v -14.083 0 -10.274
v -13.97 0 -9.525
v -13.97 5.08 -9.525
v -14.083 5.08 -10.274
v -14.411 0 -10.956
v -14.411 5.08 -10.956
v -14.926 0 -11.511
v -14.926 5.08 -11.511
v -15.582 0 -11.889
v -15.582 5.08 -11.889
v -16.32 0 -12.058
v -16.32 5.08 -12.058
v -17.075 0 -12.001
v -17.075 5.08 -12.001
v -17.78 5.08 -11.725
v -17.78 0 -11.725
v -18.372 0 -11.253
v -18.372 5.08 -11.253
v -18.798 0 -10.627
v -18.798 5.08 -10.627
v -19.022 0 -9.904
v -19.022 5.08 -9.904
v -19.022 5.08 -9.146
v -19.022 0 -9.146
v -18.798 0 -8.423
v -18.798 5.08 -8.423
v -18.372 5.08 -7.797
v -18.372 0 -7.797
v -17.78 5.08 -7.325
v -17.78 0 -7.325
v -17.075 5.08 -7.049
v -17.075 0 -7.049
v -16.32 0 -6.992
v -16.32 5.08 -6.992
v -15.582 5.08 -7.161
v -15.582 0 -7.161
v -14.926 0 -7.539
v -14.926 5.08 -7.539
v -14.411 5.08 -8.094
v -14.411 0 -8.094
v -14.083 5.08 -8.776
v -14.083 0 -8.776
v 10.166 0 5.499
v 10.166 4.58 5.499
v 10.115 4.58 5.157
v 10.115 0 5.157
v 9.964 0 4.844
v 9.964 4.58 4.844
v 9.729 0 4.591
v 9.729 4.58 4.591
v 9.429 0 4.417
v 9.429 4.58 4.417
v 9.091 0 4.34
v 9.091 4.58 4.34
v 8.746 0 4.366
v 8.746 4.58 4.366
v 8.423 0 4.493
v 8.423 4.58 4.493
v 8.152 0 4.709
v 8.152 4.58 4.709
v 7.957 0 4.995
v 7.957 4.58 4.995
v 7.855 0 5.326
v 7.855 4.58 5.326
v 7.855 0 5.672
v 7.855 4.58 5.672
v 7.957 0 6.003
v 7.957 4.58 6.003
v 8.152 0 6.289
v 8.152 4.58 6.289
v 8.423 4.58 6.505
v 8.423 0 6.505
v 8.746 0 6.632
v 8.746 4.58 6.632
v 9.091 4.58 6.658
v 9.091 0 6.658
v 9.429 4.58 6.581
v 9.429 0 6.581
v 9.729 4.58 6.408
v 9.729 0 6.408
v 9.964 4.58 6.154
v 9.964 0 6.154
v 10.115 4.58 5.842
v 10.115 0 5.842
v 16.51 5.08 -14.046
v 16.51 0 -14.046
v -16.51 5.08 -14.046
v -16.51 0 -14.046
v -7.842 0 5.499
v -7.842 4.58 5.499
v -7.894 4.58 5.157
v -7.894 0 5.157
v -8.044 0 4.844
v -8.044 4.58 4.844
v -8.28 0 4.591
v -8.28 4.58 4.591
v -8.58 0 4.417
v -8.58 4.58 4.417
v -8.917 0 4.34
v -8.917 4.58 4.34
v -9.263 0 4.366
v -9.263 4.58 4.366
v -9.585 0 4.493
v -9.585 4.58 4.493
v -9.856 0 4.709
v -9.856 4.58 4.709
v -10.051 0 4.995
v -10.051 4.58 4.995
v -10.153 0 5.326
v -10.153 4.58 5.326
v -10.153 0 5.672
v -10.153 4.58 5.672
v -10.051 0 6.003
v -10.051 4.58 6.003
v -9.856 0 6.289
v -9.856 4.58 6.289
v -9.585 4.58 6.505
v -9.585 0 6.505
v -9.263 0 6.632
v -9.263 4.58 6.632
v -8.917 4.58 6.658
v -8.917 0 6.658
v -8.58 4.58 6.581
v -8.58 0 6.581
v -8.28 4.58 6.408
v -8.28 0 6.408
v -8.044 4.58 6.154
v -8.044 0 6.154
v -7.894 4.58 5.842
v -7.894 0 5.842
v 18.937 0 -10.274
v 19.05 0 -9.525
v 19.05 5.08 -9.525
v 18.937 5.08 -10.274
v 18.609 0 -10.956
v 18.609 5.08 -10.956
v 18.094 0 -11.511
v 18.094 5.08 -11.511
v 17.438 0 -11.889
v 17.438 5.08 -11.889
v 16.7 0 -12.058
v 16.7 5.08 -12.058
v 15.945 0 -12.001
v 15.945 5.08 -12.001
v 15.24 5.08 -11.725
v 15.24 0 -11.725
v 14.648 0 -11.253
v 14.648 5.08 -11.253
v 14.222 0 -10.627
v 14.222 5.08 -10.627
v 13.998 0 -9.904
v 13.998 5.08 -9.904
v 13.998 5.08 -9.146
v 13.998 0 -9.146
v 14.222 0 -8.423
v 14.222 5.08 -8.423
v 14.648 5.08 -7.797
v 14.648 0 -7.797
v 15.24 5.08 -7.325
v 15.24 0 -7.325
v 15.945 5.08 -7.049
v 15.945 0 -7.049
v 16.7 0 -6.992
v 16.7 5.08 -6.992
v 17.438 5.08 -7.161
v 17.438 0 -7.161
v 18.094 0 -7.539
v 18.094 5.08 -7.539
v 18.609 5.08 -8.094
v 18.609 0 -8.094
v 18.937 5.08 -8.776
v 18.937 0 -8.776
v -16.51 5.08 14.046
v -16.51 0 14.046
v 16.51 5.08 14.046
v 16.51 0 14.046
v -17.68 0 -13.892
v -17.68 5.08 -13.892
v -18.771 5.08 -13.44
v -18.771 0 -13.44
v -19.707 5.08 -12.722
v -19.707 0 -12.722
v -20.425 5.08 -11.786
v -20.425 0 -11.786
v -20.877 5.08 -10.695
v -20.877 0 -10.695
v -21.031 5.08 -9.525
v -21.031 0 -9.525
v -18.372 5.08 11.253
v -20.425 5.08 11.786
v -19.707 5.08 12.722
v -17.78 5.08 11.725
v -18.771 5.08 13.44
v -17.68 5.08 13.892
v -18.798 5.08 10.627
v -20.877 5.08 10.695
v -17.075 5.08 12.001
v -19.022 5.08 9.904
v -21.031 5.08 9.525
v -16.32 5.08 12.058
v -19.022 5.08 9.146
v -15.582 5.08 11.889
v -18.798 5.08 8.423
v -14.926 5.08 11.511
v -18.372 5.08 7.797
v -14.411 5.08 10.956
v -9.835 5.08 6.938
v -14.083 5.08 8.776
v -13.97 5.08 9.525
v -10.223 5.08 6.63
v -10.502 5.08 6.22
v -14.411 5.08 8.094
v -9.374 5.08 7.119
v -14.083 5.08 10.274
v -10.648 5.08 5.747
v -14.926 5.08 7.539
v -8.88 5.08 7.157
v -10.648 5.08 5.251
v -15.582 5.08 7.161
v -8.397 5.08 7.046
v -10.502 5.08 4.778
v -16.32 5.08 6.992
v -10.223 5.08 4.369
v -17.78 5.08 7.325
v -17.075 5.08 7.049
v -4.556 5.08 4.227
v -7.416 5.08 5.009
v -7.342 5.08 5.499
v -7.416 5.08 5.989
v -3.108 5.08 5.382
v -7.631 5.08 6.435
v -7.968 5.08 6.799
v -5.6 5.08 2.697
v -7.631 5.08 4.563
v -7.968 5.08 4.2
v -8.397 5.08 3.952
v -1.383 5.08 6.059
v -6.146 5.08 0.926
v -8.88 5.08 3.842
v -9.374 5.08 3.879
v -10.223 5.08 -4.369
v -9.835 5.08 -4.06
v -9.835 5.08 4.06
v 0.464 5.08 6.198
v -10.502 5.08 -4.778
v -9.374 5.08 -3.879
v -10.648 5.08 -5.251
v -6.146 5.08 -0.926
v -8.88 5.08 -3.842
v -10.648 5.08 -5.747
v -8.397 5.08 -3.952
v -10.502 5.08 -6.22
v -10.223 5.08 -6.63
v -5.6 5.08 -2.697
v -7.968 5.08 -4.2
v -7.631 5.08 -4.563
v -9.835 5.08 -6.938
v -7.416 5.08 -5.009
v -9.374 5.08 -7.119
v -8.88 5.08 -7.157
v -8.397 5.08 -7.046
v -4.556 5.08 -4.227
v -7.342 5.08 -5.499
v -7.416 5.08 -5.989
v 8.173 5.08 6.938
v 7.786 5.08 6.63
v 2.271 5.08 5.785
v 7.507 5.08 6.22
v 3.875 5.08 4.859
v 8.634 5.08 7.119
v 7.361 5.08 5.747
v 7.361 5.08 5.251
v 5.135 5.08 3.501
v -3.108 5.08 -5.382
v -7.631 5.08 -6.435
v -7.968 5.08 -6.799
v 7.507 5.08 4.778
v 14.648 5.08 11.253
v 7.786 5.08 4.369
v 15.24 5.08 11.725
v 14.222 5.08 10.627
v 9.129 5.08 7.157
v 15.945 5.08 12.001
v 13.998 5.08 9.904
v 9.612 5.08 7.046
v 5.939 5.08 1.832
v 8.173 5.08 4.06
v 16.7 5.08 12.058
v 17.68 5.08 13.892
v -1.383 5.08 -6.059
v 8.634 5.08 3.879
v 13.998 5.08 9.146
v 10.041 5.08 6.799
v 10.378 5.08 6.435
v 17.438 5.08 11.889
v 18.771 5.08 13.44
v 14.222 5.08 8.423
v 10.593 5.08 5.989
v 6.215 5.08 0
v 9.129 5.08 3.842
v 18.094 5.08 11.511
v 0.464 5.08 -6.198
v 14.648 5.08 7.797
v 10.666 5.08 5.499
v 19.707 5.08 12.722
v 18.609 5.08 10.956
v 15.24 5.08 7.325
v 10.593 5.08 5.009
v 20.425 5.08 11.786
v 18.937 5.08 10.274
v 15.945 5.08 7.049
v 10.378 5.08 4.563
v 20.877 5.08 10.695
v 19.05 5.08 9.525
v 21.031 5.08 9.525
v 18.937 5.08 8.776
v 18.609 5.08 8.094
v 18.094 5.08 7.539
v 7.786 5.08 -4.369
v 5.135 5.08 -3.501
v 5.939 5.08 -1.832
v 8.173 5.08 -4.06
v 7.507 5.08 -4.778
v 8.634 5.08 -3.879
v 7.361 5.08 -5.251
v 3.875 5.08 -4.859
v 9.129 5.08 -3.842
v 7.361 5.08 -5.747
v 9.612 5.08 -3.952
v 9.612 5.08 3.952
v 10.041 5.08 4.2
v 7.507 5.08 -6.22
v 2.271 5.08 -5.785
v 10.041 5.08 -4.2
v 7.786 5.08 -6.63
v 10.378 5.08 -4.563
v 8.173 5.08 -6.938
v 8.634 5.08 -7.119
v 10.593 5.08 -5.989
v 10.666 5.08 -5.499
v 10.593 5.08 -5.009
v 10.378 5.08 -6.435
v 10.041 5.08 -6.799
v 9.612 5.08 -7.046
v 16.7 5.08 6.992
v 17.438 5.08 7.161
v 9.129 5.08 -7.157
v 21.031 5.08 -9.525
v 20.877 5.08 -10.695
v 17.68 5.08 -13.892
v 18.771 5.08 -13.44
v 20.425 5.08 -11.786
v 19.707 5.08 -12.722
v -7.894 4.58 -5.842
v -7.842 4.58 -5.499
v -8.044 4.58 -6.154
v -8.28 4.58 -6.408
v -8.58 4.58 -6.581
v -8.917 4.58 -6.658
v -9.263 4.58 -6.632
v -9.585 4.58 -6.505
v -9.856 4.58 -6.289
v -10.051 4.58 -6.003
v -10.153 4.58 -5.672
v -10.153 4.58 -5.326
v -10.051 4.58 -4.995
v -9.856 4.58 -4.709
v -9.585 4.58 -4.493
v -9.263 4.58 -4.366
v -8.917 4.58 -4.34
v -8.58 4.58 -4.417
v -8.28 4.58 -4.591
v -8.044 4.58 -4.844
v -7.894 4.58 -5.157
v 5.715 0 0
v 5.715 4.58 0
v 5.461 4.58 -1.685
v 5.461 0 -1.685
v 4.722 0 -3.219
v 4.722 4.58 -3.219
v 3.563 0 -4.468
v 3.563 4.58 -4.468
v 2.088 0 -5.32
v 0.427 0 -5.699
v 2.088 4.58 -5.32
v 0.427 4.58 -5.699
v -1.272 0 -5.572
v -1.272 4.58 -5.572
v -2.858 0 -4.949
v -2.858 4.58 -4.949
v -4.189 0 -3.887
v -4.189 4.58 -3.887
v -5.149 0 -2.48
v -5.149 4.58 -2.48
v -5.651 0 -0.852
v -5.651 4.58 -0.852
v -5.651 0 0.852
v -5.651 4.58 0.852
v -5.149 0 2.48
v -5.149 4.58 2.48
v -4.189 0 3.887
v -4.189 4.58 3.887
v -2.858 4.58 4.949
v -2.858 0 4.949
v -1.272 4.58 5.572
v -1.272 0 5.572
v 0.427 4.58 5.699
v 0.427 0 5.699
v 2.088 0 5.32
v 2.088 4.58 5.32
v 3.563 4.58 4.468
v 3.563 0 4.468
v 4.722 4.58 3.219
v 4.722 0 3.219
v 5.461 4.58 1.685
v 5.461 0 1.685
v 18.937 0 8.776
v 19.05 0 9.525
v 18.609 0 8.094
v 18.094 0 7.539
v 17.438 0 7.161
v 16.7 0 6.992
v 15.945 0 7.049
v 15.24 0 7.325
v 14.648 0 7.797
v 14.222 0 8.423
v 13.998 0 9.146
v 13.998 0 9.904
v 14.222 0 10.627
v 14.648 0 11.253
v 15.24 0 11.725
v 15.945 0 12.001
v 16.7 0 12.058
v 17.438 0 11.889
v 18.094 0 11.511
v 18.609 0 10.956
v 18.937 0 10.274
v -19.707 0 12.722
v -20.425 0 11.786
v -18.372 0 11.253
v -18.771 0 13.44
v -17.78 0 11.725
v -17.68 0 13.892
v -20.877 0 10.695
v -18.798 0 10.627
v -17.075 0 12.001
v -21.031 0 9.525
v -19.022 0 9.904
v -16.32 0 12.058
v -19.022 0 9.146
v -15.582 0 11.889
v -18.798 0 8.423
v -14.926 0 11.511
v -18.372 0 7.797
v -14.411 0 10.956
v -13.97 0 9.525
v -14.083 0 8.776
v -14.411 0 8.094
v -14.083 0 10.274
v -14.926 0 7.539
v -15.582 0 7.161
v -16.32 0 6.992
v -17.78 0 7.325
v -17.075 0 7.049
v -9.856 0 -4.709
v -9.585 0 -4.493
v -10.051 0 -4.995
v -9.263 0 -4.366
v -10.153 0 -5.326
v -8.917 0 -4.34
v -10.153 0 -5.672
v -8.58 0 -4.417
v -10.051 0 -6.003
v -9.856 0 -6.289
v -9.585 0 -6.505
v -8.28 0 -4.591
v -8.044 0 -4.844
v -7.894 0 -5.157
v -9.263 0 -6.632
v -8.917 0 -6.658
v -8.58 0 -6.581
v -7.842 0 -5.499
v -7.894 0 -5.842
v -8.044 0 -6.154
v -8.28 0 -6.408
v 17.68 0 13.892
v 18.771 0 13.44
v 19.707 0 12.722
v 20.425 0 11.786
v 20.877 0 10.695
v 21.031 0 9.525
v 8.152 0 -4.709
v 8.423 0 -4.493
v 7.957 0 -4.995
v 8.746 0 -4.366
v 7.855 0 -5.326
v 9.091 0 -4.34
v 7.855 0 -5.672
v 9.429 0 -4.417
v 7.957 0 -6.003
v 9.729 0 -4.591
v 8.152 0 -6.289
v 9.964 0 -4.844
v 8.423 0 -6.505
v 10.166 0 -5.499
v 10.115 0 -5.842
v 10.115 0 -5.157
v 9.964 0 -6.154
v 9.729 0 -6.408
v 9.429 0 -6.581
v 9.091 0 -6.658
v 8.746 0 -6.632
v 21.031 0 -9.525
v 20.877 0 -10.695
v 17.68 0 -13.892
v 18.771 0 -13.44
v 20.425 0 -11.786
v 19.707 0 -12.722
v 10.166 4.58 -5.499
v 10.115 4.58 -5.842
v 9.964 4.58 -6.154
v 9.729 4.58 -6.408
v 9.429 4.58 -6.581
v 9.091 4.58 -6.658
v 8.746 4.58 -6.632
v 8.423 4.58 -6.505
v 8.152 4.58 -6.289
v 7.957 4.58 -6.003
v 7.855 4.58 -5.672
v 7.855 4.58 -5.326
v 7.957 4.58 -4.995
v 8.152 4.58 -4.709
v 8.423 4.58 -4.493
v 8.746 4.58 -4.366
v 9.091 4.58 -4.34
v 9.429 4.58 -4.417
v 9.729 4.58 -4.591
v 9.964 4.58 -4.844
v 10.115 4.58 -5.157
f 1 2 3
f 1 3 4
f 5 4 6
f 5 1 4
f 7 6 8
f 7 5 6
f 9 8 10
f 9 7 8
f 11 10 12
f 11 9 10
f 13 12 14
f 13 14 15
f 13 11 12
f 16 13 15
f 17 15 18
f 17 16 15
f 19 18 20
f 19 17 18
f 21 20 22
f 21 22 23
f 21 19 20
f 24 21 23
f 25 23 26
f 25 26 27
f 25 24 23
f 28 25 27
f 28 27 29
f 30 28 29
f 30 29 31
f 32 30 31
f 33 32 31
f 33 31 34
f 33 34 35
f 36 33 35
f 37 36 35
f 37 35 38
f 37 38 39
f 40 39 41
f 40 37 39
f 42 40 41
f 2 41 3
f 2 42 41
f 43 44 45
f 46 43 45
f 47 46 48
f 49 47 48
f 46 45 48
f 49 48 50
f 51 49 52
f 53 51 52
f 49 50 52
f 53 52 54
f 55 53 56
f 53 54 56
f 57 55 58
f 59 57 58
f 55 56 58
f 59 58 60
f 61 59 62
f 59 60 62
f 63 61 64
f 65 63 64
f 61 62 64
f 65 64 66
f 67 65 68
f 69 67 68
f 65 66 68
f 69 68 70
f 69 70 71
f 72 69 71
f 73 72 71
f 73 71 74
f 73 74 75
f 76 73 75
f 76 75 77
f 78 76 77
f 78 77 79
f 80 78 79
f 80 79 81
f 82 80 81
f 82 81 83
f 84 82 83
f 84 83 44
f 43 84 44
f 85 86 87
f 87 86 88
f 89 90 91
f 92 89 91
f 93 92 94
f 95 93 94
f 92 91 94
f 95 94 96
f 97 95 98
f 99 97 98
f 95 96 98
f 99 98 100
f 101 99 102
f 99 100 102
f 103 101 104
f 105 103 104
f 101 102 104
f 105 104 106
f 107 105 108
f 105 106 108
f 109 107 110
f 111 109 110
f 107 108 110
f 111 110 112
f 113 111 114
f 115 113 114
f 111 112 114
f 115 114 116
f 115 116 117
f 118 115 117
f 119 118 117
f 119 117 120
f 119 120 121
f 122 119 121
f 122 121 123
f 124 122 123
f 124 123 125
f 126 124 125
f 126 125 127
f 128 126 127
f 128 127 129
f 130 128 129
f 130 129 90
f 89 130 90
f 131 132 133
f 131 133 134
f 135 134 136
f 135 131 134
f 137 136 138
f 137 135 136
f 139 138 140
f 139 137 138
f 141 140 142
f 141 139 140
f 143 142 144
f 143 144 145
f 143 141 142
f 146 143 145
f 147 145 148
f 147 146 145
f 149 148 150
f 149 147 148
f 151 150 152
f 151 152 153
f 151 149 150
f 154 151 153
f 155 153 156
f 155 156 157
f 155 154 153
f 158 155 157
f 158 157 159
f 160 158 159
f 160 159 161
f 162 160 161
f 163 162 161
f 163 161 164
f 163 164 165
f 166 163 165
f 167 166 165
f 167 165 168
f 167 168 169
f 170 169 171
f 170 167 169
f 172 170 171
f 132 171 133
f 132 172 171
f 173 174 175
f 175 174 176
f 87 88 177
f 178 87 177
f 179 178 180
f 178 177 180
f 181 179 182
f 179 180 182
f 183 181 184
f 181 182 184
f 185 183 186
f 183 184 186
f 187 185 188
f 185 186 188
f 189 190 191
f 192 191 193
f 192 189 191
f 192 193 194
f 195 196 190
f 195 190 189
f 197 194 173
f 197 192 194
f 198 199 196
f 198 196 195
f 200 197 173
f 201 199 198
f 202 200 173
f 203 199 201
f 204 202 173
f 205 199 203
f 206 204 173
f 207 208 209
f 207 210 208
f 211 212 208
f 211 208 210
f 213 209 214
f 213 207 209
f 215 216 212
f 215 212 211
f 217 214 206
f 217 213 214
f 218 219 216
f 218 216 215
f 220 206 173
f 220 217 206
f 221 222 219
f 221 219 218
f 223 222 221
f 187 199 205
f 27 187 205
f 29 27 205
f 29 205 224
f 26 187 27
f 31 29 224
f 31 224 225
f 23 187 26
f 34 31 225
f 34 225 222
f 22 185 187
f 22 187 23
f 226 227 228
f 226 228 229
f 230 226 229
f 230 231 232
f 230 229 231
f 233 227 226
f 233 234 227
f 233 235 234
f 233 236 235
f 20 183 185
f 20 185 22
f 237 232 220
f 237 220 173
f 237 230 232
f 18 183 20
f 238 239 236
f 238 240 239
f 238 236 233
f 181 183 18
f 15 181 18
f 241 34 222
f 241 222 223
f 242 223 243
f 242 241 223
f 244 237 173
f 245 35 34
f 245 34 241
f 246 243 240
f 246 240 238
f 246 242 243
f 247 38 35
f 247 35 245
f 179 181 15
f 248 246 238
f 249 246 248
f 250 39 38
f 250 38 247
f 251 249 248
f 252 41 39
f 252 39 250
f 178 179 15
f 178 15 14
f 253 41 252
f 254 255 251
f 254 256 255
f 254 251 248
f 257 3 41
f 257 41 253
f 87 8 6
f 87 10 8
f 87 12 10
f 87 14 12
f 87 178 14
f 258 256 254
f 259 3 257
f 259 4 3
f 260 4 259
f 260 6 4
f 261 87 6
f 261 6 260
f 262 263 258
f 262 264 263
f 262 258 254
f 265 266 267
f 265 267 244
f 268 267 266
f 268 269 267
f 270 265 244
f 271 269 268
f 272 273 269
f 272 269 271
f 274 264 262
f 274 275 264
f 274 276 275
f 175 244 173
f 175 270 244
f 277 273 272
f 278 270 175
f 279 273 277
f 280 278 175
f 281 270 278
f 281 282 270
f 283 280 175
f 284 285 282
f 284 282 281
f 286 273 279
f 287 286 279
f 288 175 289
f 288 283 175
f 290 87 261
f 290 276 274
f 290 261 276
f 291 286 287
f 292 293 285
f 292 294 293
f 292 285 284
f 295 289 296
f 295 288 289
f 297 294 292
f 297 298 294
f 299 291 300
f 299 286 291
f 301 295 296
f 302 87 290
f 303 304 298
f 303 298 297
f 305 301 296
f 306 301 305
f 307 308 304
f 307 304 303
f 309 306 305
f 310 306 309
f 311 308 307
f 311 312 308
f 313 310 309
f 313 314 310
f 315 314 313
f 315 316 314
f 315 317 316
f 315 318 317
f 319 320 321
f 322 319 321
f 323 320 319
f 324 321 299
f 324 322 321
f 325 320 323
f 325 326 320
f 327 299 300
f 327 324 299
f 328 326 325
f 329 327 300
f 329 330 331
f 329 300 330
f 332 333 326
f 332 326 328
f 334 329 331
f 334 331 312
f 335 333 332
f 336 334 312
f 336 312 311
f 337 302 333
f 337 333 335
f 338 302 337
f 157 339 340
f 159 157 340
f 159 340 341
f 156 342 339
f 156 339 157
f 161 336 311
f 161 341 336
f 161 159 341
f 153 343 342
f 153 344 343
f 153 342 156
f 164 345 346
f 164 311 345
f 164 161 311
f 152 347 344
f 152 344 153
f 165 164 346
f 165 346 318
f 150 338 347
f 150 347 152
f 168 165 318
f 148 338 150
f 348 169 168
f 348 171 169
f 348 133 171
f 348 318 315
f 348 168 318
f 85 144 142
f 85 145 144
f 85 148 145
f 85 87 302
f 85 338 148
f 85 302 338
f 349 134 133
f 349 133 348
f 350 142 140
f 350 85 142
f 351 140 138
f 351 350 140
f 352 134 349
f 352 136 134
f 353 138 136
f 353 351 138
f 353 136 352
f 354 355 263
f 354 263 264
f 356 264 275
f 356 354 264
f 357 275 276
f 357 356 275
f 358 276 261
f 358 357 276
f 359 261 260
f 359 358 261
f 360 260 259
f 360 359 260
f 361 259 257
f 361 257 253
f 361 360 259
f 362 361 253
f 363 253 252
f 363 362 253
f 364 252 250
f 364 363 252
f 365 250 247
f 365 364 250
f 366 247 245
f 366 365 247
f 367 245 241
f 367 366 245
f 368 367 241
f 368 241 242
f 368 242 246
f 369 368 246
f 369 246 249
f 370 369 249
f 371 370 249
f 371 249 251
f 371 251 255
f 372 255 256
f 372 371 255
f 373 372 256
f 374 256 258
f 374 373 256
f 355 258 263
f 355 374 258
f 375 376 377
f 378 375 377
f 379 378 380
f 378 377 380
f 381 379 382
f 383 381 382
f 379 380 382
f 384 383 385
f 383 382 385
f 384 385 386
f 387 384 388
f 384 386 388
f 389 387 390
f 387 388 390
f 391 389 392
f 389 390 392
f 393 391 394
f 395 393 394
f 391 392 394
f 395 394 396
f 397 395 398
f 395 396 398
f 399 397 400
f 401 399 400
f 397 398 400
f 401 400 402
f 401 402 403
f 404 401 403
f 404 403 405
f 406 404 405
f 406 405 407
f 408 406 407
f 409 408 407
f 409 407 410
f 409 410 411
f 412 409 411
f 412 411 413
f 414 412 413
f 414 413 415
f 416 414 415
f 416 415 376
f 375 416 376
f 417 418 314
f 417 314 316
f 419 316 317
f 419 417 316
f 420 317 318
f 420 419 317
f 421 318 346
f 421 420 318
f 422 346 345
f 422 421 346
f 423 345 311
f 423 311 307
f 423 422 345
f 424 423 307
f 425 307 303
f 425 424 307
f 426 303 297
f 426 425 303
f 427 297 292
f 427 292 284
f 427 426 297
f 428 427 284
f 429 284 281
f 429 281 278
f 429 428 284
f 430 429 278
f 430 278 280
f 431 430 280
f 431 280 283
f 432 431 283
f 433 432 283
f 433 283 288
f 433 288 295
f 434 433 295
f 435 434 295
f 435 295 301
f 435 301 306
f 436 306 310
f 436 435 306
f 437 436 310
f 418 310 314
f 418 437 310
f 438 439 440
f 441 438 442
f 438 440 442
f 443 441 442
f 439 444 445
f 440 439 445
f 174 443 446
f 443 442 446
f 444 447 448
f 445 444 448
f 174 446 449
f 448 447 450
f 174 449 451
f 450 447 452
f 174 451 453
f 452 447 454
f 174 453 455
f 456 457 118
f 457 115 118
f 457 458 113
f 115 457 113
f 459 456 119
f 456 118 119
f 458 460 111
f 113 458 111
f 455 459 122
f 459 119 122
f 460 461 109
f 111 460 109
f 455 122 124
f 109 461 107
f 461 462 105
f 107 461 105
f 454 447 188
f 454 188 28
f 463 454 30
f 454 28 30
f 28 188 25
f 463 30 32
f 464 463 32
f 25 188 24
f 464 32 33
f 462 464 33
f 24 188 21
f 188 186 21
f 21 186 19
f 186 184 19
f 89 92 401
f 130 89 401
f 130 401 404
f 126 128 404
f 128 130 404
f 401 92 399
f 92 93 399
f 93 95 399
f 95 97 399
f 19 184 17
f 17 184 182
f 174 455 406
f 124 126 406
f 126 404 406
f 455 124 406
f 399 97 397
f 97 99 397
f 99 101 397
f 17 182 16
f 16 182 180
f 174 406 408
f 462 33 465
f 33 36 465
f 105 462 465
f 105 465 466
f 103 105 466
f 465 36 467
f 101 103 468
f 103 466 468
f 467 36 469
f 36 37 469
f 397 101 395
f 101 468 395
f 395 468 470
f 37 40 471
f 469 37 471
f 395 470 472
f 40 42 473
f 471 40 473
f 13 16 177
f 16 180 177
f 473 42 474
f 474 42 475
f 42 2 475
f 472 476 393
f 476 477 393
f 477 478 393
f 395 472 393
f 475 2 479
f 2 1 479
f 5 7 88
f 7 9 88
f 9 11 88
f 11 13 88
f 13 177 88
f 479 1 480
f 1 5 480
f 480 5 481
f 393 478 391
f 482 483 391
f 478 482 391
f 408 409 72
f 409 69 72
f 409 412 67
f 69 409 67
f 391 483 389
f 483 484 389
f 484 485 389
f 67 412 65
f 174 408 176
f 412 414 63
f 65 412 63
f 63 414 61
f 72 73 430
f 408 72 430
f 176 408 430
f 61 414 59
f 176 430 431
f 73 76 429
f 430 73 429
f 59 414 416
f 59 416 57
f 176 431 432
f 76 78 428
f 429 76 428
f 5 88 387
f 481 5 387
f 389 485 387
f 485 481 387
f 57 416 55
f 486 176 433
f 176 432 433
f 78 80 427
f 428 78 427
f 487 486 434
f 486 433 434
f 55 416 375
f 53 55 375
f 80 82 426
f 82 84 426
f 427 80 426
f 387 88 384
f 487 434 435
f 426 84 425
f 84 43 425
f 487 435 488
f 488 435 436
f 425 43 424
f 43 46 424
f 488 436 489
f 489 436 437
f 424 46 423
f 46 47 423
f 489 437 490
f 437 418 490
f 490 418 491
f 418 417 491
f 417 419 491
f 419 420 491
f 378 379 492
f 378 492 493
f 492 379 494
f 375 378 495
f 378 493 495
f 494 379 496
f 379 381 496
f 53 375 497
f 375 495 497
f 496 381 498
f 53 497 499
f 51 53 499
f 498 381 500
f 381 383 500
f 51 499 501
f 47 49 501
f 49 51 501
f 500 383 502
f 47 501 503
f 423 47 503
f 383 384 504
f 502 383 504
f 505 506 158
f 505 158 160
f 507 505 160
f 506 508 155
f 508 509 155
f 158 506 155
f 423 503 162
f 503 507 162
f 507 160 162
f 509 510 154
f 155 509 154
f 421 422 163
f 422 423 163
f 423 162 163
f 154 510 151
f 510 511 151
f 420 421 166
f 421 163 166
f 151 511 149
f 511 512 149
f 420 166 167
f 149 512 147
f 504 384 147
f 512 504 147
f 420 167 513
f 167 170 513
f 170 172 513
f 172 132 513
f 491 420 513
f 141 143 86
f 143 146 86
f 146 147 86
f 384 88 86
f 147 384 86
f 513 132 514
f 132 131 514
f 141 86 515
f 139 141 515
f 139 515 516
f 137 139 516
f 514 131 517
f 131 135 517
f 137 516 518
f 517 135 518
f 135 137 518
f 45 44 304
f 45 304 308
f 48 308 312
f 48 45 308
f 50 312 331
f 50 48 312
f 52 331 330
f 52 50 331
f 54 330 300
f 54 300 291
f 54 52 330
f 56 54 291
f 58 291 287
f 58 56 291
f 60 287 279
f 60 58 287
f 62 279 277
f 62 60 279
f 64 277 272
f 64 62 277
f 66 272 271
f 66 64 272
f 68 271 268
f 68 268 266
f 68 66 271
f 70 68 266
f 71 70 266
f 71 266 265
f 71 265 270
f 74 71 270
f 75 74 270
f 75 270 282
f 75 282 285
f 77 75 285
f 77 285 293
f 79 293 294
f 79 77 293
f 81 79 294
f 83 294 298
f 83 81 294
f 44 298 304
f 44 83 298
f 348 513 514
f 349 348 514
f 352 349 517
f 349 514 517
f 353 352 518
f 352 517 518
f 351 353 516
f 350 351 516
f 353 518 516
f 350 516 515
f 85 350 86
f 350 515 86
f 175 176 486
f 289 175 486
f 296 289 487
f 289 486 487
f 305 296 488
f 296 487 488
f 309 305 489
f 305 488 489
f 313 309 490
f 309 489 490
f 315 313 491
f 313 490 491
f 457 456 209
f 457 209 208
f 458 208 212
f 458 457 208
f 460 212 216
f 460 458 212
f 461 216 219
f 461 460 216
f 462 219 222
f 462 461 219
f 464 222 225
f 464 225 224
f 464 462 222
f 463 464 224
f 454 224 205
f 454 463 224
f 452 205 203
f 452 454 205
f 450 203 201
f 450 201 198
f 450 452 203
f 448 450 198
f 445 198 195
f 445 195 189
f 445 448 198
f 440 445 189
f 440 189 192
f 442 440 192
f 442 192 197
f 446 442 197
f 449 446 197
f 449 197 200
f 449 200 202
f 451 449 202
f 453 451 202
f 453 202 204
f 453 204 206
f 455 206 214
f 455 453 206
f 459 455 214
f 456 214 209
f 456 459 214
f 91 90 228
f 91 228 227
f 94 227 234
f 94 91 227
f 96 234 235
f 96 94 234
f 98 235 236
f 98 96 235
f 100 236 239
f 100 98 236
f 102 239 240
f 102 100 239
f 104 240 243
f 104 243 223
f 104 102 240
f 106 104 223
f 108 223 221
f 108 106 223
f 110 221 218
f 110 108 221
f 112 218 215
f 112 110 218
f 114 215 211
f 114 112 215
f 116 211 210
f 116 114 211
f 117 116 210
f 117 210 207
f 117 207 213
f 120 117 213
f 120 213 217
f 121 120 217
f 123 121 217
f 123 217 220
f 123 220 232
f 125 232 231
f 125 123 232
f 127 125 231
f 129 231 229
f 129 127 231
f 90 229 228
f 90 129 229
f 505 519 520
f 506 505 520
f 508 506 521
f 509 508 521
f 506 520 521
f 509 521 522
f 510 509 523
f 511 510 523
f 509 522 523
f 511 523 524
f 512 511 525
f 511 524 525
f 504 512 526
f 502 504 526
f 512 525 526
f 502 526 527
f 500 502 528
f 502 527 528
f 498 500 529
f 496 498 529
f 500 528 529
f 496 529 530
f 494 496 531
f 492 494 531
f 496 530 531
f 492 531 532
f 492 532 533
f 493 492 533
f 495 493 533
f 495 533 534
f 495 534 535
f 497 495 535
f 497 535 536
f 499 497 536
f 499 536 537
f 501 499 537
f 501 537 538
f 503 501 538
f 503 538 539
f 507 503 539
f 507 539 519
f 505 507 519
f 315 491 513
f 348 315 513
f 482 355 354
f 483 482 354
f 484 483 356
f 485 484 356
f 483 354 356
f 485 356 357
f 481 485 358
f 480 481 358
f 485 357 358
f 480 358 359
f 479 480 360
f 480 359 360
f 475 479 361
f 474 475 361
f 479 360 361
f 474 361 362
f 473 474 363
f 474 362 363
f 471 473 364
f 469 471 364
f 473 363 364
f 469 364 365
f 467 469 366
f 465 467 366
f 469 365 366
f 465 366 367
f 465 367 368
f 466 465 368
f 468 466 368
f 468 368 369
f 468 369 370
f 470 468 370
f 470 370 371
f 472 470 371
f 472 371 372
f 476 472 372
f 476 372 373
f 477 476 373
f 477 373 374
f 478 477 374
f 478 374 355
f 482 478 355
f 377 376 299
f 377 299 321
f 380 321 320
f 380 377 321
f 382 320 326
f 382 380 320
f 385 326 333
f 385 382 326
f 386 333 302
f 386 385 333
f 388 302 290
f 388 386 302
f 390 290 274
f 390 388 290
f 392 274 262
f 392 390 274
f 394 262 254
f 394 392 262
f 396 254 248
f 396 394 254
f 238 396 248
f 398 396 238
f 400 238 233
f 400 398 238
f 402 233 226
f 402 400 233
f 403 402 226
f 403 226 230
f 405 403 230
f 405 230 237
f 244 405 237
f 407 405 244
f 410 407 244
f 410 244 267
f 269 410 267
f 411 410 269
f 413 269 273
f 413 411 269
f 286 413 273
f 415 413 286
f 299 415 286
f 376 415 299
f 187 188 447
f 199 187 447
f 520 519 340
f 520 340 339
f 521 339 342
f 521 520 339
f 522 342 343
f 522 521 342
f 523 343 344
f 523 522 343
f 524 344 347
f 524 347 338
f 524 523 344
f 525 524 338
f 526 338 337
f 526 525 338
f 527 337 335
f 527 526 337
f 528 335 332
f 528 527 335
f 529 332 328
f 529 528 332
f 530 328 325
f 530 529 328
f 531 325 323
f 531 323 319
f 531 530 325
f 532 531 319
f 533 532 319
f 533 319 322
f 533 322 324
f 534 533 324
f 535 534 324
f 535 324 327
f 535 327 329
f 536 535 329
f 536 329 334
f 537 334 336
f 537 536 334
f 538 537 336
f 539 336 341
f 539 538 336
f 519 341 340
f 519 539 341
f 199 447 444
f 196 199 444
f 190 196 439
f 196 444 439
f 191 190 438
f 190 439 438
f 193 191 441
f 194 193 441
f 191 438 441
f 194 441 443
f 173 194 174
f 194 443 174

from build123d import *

# Parameters (mm, degrees)
SKETCH1_R           = 2.54
BOSS_EXTRUDE1_DEPTH = 5.08
SKETCH3_R           = 1.16205
SKETCH3_R_2         = 5.715
CUT_EXTRUDE4_DEPTH  = 6.08
CHAMFER1_SIZE       = 0.5


with BuildPart() as part:
    # Sketch1 → Boss-Extrude1 (new body)
    with BuildSketch(Plane(origin=(0, 0, 0), x_dir=(1, 0, 0), z_dir=(0, 1, 0))):
        with BuildLine():
            Line((-16.51, -14.0462), (16.51, -14.0462))
            ThreePointArc((16.51, -14.0462), (19.706971179, -12.721971179), (21.0312, -9.525))
            Line((21.0312, -9.525), (21.0312, 9.525))
            ThreePointArc((21.0312, 9.525), (19.706971179, 12.721971179), (16.51, 14.0462))
            Line((16.51, 14.0462), (-16.51, 14.0462))
            ThreePointArc((-16.51, 14.0462), (-19.706971179, 12.721971179), (-21.0312, 9.525))
            Line((-21.0312, 9.525), (-21.0312, -9.525))
            ThreePointArc((-21.0312, -9.525), (-19.706971179, -12.721971179), (-16.51, -14.0462))
        make_face()
        with Locations((-16.51, 9.525)):
            Circle(SKETCH1_R, mode=Mode.SUBTRACT)
        with Locations((-16.51, -9.525)):
            Circle(SKETCH1_R, mode=Mode.SUBTRACT)
        with Locations((16.51, -9.525)):
            Circle(SKETCH1_R, mode=Mode.SUBTRACT)
        with Locations((16.51, 9.525)):
            Circle(SKETCH1_R, mode=Mode.SUBTRACT)
    extrude(amount=BOSS_EXTRUDE1_DEPTH)

    # Sketch3 → Cut-Extrude4 (cut, through all)
    with BuildSketch(Plane(origin=(0, 5.08, 0), x_dir=(1, 0, 0), z_dir=(0, 1, 0))):
        with Locations((-9.0043, 5.4991)):
            Circle(SKETCH3_R)
        with Locations((9.0043, 5.4991)):
            Circle(SKETCH3_R)
        with Locations((9.0043, -5.4991)):
            Circle(SKETCH3_R)
        with Locations((-9.0043, -5.4991)):
            Circle(SKETCH3_R)
        Circle(SKETCH3_R_2)
    extrude(amount=-CUT_EXTRUDE4_DEPTH, mode=Mode.SUBTRACT)

    # Chamfer1
    chamfer1_edges = [part.edges().sort_by_distance(p)[0] for p in [
        (-5.715, 5.08, 0),
        (-10.16635, 5.08, 5.4991),
        (7.84225, 5.08, 5.4991),
        (7.84225, 5.08, -5.4991),
        (-10.16635, 5.08, -5.4991),
    ]]
    chamfer(chamfer1_edges, length=CHAMFER1_SIZE)


solid = part.part
